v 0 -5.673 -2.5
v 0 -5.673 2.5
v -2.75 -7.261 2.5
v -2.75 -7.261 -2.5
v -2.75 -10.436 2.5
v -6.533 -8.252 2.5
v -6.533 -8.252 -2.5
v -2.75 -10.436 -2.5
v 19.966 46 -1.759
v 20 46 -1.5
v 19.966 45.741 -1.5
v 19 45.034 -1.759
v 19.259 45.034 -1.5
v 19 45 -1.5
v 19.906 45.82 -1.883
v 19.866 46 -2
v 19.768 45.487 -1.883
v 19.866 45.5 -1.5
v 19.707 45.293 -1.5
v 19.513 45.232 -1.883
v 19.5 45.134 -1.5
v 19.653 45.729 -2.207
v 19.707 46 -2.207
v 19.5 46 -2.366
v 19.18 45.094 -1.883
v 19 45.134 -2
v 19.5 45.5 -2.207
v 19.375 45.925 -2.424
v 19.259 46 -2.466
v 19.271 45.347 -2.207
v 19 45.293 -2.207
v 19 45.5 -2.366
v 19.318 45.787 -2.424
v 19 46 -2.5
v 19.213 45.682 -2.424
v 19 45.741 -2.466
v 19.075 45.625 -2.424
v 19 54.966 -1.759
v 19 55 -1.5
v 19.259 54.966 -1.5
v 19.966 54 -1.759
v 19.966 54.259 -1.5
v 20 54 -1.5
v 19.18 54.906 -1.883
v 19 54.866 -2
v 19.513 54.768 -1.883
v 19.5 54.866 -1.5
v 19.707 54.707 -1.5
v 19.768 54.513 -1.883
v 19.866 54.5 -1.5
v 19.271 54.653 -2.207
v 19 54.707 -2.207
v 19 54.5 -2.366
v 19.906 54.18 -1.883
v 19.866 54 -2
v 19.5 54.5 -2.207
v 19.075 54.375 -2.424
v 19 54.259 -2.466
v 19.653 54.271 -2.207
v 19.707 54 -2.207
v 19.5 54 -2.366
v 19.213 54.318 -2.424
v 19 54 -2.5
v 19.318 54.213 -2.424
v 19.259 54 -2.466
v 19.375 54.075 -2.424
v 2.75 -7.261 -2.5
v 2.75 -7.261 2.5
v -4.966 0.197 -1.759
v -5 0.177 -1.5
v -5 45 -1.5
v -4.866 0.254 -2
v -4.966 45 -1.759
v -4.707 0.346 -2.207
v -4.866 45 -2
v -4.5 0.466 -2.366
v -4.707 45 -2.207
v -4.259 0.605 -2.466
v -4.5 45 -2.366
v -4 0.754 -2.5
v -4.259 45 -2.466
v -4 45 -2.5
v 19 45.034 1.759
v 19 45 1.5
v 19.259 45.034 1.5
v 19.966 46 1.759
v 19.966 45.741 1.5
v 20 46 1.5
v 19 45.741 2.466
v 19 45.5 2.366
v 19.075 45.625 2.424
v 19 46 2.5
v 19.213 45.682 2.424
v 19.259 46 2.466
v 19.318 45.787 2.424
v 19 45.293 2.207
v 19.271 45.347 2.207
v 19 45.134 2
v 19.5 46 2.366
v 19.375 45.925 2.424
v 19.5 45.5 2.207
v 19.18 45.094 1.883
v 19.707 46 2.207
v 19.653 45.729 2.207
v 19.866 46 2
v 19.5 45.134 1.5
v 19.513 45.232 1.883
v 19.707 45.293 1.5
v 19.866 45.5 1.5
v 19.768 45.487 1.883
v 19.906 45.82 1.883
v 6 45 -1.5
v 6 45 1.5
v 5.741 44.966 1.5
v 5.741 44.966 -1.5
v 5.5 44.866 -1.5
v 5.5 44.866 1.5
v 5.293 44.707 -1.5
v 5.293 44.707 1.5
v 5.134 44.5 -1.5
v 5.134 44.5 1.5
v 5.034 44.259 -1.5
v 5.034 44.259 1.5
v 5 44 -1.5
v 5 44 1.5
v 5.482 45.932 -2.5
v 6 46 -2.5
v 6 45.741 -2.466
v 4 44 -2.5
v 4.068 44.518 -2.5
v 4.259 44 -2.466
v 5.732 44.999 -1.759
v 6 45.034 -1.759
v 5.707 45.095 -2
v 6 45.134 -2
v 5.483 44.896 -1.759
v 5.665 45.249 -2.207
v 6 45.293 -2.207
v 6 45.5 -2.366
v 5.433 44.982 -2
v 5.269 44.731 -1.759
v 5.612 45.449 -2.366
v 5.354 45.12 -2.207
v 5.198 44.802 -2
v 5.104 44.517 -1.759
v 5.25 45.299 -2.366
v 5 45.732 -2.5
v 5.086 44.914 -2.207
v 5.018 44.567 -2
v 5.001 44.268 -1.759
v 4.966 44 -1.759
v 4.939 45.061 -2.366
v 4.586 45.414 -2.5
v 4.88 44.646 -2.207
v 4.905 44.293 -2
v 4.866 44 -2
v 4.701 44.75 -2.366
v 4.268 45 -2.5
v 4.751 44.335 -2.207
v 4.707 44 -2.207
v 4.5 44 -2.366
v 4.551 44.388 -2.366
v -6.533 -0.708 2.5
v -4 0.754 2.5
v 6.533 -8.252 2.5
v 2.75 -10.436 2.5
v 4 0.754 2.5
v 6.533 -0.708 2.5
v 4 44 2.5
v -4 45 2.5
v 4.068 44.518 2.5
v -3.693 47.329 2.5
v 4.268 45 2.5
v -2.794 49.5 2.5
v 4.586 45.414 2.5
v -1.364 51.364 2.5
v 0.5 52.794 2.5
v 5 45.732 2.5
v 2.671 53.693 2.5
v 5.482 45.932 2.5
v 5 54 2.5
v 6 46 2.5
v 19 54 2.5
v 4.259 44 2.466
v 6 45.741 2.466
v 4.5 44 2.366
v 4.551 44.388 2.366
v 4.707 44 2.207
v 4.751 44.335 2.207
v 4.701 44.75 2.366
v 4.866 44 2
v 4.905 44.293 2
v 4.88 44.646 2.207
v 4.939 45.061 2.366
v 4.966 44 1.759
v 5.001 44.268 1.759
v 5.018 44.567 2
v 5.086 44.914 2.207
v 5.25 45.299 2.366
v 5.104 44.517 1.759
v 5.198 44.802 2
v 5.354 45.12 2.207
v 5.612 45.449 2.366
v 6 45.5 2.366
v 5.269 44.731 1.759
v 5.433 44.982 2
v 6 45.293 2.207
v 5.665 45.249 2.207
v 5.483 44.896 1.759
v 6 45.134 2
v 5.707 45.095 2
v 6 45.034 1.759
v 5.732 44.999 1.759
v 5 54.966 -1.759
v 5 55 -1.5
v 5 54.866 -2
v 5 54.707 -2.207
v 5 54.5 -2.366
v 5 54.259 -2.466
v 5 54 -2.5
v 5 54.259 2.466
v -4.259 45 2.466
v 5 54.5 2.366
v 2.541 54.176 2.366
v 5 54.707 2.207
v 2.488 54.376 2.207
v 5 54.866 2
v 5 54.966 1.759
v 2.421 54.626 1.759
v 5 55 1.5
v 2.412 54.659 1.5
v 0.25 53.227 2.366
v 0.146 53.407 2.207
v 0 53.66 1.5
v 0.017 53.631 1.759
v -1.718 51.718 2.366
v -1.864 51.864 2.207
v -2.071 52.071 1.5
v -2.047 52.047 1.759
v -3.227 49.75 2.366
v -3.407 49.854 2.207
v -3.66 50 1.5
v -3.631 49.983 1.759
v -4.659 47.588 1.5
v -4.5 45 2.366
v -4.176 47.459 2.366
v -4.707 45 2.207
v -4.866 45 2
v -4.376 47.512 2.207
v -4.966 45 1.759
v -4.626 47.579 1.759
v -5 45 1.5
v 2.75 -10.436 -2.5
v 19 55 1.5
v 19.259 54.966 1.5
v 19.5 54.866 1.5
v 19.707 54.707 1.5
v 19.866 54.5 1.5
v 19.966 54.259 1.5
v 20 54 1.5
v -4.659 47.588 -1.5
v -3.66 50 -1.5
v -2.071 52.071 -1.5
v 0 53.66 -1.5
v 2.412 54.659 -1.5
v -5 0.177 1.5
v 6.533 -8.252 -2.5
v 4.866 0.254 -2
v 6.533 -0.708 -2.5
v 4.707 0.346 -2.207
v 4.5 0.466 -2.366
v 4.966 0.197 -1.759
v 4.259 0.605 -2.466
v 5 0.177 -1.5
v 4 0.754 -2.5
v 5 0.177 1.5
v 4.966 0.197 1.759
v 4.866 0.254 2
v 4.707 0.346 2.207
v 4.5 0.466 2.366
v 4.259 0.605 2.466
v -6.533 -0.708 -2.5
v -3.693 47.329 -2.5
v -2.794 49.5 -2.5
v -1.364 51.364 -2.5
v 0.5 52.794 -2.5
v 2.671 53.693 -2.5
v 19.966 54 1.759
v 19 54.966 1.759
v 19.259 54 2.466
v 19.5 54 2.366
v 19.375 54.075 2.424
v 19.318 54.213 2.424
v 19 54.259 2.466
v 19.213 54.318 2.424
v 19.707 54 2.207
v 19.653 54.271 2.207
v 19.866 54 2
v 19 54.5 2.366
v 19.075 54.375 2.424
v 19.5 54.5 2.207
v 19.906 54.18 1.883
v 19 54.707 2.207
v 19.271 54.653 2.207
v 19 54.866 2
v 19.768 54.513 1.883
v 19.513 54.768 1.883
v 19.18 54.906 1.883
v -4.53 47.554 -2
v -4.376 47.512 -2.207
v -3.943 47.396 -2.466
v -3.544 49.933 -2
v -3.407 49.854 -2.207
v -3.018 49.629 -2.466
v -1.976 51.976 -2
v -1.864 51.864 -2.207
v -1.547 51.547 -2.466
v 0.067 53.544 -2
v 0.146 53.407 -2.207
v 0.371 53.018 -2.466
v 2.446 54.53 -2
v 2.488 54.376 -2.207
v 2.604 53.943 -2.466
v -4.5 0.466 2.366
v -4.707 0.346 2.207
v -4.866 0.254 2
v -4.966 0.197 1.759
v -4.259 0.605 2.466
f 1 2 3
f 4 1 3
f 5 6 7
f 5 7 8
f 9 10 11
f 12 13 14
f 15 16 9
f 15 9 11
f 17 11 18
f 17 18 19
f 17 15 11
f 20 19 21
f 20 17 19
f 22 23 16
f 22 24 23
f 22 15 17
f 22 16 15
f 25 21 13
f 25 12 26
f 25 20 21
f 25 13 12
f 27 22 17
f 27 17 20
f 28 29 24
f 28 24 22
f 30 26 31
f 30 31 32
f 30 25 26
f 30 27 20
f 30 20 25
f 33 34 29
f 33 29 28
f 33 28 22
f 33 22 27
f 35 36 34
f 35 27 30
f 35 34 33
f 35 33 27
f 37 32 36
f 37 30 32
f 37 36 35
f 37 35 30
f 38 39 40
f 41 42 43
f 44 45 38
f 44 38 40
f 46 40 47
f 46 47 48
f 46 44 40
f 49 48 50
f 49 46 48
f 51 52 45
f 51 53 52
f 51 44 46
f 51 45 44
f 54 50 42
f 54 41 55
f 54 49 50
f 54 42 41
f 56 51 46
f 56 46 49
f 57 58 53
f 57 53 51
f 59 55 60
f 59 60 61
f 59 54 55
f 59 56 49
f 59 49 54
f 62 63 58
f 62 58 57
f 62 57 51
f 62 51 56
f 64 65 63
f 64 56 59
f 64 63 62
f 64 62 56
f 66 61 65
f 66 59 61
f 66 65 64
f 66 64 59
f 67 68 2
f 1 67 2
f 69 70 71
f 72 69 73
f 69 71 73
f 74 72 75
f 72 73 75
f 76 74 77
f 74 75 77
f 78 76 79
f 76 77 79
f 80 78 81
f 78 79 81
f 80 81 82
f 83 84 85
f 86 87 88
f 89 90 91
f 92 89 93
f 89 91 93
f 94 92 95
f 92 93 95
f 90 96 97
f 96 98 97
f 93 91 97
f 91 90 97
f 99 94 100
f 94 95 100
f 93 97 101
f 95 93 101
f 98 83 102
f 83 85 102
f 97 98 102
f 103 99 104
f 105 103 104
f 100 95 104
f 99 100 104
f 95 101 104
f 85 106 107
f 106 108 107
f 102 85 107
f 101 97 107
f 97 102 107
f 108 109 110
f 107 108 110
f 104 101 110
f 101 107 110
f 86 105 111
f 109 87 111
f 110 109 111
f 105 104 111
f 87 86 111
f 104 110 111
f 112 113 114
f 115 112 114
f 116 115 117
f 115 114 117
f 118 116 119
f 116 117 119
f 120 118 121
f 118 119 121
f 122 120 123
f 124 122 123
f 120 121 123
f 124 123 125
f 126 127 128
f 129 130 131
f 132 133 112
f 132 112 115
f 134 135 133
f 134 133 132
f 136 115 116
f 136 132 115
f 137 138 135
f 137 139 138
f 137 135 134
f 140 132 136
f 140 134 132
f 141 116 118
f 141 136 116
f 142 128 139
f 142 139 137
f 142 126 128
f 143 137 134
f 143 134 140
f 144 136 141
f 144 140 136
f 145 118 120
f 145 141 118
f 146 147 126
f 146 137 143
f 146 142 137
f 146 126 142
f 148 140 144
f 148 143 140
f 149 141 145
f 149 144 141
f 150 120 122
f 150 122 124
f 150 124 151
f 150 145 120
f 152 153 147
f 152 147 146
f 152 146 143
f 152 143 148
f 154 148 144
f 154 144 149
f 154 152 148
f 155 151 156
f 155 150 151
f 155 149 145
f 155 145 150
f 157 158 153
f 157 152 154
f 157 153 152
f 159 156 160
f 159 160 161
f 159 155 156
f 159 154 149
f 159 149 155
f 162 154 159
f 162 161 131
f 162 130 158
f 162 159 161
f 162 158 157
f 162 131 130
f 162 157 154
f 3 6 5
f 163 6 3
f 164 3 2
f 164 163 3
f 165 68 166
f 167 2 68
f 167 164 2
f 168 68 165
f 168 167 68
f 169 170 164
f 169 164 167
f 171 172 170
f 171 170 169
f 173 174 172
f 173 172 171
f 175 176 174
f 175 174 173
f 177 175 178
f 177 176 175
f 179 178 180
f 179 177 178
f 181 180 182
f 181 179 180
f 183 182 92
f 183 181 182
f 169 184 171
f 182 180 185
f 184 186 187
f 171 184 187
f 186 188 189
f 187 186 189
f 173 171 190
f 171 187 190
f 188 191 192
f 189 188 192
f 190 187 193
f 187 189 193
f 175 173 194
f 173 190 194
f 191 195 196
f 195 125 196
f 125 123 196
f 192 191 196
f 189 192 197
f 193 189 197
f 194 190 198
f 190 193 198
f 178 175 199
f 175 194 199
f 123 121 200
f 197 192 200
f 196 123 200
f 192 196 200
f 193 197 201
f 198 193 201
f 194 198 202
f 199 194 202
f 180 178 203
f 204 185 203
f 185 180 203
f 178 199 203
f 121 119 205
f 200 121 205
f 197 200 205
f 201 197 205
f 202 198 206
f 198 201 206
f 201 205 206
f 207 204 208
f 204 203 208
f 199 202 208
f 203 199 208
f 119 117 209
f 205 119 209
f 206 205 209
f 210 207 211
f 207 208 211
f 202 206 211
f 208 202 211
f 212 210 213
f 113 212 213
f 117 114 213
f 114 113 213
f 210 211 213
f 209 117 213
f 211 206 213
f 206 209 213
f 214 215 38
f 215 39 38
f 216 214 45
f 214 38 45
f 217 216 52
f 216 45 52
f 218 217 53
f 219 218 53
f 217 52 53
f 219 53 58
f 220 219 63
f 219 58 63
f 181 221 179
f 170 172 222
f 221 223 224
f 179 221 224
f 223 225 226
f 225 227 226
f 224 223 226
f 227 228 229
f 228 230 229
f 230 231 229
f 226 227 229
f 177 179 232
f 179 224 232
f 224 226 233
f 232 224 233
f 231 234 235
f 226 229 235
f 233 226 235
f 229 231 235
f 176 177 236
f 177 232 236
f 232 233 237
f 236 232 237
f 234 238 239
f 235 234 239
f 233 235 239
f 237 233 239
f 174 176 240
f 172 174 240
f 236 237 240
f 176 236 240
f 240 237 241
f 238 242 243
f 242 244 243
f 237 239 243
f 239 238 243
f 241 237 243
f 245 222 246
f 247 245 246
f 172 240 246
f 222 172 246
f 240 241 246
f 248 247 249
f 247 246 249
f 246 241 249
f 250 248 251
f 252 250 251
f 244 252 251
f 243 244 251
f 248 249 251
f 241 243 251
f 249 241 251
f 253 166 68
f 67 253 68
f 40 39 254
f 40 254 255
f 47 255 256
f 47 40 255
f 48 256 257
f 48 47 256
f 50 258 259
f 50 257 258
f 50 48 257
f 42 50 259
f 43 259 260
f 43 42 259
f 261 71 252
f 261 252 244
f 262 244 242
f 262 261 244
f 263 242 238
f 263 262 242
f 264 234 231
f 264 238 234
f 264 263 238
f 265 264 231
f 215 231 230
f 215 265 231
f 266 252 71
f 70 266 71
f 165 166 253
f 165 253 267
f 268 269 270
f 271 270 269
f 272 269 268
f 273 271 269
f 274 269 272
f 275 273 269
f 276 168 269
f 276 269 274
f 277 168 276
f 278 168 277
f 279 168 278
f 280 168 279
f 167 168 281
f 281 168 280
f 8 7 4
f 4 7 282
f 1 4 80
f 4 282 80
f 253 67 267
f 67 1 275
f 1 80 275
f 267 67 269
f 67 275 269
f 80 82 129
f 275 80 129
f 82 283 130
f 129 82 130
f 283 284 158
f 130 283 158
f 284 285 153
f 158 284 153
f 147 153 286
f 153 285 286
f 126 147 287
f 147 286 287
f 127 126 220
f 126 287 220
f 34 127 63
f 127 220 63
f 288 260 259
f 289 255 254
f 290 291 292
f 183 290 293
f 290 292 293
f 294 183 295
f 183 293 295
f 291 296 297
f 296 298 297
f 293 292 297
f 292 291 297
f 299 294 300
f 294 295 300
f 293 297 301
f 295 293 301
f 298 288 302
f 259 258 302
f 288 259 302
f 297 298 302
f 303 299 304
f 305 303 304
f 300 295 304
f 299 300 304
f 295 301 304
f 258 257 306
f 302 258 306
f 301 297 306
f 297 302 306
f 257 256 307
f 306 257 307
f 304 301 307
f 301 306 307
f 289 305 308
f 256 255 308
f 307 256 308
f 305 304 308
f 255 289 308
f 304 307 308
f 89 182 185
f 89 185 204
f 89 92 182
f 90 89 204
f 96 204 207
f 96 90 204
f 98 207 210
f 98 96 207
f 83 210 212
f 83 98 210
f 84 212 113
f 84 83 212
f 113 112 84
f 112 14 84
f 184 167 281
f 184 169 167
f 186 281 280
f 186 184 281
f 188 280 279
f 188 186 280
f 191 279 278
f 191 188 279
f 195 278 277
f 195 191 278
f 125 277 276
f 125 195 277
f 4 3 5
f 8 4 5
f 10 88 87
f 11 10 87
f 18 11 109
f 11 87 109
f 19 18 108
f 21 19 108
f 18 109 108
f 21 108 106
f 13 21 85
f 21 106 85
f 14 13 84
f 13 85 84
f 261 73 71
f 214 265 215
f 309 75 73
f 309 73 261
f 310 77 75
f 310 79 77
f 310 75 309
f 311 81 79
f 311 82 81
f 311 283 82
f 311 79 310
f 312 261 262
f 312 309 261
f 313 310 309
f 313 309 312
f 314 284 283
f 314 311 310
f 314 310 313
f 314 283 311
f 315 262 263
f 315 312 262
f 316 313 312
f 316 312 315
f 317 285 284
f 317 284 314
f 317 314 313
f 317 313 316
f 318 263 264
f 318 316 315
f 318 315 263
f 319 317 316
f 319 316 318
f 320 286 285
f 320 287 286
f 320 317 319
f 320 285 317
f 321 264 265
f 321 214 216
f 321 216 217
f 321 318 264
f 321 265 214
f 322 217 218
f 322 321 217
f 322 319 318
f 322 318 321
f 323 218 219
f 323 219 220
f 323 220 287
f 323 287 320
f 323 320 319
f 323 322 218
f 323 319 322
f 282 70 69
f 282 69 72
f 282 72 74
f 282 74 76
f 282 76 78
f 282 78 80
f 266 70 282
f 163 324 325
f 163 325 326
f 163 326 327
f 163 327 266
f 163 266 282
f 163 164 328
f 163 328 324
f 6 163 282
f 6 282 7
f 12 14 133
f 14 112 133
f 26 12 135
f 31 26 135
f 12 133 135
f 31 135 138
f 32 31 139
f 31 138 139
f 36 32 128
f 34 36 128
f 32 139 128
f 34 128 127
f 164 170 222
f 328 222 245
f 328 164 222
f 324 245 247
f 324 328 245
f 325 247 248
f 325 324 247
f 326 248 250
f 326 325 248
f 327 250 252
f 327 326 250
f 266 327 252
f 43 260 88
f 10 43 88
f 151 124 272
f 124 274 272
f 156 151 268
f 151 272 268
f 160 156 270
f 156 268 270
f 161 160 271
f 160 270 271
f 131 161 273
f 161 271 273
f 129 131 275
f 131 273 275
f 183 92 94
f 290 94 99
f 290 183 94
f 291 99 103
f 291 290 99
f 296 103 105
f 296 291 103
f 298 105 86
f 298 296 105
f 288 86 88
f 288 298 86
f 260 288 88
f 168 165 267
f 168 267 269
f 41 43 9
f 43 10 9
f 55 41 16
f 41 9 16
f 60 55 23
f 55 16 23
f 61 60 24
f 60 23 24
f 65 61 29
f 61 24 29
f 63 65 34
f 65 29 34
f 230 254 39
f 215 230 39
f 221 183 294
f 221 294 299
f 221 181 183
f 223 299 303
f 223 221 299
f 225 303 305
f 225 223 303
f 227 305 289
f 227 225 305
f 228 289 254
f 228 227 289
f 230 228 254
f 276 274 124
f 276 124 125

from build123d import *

# Parameters (mm, degrees)
F0_W     = 10
F0_H     = 5
F4_DEPTH = 5
F6_DEPTH = 5
F7_R     = 1
F8_R     = 1


with BuildPart() as f2:
    # F2: sweep along a path in F1
    with BuildLine(Plane.XY) as f2_path:
        Line((0, 0), (0, 45))
        ThreePointArc((0, 45), (1.4644660941, 48.5355339059), (5, 50))
        Line((5, 50), (20, 50))
    # F0 (on Front) → F2 (sweep)
    with BuildSketch(Plane.XZ):
        Rectangle(F0_W, F0_H)
    sweep(path=f2_path.line)

    # F3 (on face) → F4 (join, through all)
    with BuildSketch(Plane.XY.offset(2.5)):
        Polygon((0, -12.0238676125), (6.5331561742, -8.2519481366), (6.5331561742, -0.708109185), (0, 3.0638102908), (-6.5331561742, -0.708109185), (-6.5331561742, -8.2519481366), align=None)
    extrude(amount=-F4_DEPTH)

    # F5 (on face) → F6 (cut, through all)
    with BuildSketch(Plane.XY.offset(2.5)):
        Polygon((0, -12.0238676125), (2.75, -10.4361543722), (2.75, -7.2607278916), (0, -5.6730146514), (-2.75, -7.2607278916), (-2.75, -10.4361543722), align=None)
    extrude(amount=-F6_DEPTH, mode=Mode.SUBTRACT)

    # F7
    f7_edges = [f2.edges().sort_by_distance(p)[0] for p in [
        (20, 55, 0),
        (20, 45, 0),
        (5, 45, 0),
    ]]
    fillet(f7_edges, radius=F7_R)

    # F8
    f8_edges = [f2.edges().sort_by_distance(p)[0] for p in [
        (20, 50, 2.5),
        (20, 50, -2.5),
    ]]
    fillet(f8_edges, radius=F8_R)


solid = f2.part
